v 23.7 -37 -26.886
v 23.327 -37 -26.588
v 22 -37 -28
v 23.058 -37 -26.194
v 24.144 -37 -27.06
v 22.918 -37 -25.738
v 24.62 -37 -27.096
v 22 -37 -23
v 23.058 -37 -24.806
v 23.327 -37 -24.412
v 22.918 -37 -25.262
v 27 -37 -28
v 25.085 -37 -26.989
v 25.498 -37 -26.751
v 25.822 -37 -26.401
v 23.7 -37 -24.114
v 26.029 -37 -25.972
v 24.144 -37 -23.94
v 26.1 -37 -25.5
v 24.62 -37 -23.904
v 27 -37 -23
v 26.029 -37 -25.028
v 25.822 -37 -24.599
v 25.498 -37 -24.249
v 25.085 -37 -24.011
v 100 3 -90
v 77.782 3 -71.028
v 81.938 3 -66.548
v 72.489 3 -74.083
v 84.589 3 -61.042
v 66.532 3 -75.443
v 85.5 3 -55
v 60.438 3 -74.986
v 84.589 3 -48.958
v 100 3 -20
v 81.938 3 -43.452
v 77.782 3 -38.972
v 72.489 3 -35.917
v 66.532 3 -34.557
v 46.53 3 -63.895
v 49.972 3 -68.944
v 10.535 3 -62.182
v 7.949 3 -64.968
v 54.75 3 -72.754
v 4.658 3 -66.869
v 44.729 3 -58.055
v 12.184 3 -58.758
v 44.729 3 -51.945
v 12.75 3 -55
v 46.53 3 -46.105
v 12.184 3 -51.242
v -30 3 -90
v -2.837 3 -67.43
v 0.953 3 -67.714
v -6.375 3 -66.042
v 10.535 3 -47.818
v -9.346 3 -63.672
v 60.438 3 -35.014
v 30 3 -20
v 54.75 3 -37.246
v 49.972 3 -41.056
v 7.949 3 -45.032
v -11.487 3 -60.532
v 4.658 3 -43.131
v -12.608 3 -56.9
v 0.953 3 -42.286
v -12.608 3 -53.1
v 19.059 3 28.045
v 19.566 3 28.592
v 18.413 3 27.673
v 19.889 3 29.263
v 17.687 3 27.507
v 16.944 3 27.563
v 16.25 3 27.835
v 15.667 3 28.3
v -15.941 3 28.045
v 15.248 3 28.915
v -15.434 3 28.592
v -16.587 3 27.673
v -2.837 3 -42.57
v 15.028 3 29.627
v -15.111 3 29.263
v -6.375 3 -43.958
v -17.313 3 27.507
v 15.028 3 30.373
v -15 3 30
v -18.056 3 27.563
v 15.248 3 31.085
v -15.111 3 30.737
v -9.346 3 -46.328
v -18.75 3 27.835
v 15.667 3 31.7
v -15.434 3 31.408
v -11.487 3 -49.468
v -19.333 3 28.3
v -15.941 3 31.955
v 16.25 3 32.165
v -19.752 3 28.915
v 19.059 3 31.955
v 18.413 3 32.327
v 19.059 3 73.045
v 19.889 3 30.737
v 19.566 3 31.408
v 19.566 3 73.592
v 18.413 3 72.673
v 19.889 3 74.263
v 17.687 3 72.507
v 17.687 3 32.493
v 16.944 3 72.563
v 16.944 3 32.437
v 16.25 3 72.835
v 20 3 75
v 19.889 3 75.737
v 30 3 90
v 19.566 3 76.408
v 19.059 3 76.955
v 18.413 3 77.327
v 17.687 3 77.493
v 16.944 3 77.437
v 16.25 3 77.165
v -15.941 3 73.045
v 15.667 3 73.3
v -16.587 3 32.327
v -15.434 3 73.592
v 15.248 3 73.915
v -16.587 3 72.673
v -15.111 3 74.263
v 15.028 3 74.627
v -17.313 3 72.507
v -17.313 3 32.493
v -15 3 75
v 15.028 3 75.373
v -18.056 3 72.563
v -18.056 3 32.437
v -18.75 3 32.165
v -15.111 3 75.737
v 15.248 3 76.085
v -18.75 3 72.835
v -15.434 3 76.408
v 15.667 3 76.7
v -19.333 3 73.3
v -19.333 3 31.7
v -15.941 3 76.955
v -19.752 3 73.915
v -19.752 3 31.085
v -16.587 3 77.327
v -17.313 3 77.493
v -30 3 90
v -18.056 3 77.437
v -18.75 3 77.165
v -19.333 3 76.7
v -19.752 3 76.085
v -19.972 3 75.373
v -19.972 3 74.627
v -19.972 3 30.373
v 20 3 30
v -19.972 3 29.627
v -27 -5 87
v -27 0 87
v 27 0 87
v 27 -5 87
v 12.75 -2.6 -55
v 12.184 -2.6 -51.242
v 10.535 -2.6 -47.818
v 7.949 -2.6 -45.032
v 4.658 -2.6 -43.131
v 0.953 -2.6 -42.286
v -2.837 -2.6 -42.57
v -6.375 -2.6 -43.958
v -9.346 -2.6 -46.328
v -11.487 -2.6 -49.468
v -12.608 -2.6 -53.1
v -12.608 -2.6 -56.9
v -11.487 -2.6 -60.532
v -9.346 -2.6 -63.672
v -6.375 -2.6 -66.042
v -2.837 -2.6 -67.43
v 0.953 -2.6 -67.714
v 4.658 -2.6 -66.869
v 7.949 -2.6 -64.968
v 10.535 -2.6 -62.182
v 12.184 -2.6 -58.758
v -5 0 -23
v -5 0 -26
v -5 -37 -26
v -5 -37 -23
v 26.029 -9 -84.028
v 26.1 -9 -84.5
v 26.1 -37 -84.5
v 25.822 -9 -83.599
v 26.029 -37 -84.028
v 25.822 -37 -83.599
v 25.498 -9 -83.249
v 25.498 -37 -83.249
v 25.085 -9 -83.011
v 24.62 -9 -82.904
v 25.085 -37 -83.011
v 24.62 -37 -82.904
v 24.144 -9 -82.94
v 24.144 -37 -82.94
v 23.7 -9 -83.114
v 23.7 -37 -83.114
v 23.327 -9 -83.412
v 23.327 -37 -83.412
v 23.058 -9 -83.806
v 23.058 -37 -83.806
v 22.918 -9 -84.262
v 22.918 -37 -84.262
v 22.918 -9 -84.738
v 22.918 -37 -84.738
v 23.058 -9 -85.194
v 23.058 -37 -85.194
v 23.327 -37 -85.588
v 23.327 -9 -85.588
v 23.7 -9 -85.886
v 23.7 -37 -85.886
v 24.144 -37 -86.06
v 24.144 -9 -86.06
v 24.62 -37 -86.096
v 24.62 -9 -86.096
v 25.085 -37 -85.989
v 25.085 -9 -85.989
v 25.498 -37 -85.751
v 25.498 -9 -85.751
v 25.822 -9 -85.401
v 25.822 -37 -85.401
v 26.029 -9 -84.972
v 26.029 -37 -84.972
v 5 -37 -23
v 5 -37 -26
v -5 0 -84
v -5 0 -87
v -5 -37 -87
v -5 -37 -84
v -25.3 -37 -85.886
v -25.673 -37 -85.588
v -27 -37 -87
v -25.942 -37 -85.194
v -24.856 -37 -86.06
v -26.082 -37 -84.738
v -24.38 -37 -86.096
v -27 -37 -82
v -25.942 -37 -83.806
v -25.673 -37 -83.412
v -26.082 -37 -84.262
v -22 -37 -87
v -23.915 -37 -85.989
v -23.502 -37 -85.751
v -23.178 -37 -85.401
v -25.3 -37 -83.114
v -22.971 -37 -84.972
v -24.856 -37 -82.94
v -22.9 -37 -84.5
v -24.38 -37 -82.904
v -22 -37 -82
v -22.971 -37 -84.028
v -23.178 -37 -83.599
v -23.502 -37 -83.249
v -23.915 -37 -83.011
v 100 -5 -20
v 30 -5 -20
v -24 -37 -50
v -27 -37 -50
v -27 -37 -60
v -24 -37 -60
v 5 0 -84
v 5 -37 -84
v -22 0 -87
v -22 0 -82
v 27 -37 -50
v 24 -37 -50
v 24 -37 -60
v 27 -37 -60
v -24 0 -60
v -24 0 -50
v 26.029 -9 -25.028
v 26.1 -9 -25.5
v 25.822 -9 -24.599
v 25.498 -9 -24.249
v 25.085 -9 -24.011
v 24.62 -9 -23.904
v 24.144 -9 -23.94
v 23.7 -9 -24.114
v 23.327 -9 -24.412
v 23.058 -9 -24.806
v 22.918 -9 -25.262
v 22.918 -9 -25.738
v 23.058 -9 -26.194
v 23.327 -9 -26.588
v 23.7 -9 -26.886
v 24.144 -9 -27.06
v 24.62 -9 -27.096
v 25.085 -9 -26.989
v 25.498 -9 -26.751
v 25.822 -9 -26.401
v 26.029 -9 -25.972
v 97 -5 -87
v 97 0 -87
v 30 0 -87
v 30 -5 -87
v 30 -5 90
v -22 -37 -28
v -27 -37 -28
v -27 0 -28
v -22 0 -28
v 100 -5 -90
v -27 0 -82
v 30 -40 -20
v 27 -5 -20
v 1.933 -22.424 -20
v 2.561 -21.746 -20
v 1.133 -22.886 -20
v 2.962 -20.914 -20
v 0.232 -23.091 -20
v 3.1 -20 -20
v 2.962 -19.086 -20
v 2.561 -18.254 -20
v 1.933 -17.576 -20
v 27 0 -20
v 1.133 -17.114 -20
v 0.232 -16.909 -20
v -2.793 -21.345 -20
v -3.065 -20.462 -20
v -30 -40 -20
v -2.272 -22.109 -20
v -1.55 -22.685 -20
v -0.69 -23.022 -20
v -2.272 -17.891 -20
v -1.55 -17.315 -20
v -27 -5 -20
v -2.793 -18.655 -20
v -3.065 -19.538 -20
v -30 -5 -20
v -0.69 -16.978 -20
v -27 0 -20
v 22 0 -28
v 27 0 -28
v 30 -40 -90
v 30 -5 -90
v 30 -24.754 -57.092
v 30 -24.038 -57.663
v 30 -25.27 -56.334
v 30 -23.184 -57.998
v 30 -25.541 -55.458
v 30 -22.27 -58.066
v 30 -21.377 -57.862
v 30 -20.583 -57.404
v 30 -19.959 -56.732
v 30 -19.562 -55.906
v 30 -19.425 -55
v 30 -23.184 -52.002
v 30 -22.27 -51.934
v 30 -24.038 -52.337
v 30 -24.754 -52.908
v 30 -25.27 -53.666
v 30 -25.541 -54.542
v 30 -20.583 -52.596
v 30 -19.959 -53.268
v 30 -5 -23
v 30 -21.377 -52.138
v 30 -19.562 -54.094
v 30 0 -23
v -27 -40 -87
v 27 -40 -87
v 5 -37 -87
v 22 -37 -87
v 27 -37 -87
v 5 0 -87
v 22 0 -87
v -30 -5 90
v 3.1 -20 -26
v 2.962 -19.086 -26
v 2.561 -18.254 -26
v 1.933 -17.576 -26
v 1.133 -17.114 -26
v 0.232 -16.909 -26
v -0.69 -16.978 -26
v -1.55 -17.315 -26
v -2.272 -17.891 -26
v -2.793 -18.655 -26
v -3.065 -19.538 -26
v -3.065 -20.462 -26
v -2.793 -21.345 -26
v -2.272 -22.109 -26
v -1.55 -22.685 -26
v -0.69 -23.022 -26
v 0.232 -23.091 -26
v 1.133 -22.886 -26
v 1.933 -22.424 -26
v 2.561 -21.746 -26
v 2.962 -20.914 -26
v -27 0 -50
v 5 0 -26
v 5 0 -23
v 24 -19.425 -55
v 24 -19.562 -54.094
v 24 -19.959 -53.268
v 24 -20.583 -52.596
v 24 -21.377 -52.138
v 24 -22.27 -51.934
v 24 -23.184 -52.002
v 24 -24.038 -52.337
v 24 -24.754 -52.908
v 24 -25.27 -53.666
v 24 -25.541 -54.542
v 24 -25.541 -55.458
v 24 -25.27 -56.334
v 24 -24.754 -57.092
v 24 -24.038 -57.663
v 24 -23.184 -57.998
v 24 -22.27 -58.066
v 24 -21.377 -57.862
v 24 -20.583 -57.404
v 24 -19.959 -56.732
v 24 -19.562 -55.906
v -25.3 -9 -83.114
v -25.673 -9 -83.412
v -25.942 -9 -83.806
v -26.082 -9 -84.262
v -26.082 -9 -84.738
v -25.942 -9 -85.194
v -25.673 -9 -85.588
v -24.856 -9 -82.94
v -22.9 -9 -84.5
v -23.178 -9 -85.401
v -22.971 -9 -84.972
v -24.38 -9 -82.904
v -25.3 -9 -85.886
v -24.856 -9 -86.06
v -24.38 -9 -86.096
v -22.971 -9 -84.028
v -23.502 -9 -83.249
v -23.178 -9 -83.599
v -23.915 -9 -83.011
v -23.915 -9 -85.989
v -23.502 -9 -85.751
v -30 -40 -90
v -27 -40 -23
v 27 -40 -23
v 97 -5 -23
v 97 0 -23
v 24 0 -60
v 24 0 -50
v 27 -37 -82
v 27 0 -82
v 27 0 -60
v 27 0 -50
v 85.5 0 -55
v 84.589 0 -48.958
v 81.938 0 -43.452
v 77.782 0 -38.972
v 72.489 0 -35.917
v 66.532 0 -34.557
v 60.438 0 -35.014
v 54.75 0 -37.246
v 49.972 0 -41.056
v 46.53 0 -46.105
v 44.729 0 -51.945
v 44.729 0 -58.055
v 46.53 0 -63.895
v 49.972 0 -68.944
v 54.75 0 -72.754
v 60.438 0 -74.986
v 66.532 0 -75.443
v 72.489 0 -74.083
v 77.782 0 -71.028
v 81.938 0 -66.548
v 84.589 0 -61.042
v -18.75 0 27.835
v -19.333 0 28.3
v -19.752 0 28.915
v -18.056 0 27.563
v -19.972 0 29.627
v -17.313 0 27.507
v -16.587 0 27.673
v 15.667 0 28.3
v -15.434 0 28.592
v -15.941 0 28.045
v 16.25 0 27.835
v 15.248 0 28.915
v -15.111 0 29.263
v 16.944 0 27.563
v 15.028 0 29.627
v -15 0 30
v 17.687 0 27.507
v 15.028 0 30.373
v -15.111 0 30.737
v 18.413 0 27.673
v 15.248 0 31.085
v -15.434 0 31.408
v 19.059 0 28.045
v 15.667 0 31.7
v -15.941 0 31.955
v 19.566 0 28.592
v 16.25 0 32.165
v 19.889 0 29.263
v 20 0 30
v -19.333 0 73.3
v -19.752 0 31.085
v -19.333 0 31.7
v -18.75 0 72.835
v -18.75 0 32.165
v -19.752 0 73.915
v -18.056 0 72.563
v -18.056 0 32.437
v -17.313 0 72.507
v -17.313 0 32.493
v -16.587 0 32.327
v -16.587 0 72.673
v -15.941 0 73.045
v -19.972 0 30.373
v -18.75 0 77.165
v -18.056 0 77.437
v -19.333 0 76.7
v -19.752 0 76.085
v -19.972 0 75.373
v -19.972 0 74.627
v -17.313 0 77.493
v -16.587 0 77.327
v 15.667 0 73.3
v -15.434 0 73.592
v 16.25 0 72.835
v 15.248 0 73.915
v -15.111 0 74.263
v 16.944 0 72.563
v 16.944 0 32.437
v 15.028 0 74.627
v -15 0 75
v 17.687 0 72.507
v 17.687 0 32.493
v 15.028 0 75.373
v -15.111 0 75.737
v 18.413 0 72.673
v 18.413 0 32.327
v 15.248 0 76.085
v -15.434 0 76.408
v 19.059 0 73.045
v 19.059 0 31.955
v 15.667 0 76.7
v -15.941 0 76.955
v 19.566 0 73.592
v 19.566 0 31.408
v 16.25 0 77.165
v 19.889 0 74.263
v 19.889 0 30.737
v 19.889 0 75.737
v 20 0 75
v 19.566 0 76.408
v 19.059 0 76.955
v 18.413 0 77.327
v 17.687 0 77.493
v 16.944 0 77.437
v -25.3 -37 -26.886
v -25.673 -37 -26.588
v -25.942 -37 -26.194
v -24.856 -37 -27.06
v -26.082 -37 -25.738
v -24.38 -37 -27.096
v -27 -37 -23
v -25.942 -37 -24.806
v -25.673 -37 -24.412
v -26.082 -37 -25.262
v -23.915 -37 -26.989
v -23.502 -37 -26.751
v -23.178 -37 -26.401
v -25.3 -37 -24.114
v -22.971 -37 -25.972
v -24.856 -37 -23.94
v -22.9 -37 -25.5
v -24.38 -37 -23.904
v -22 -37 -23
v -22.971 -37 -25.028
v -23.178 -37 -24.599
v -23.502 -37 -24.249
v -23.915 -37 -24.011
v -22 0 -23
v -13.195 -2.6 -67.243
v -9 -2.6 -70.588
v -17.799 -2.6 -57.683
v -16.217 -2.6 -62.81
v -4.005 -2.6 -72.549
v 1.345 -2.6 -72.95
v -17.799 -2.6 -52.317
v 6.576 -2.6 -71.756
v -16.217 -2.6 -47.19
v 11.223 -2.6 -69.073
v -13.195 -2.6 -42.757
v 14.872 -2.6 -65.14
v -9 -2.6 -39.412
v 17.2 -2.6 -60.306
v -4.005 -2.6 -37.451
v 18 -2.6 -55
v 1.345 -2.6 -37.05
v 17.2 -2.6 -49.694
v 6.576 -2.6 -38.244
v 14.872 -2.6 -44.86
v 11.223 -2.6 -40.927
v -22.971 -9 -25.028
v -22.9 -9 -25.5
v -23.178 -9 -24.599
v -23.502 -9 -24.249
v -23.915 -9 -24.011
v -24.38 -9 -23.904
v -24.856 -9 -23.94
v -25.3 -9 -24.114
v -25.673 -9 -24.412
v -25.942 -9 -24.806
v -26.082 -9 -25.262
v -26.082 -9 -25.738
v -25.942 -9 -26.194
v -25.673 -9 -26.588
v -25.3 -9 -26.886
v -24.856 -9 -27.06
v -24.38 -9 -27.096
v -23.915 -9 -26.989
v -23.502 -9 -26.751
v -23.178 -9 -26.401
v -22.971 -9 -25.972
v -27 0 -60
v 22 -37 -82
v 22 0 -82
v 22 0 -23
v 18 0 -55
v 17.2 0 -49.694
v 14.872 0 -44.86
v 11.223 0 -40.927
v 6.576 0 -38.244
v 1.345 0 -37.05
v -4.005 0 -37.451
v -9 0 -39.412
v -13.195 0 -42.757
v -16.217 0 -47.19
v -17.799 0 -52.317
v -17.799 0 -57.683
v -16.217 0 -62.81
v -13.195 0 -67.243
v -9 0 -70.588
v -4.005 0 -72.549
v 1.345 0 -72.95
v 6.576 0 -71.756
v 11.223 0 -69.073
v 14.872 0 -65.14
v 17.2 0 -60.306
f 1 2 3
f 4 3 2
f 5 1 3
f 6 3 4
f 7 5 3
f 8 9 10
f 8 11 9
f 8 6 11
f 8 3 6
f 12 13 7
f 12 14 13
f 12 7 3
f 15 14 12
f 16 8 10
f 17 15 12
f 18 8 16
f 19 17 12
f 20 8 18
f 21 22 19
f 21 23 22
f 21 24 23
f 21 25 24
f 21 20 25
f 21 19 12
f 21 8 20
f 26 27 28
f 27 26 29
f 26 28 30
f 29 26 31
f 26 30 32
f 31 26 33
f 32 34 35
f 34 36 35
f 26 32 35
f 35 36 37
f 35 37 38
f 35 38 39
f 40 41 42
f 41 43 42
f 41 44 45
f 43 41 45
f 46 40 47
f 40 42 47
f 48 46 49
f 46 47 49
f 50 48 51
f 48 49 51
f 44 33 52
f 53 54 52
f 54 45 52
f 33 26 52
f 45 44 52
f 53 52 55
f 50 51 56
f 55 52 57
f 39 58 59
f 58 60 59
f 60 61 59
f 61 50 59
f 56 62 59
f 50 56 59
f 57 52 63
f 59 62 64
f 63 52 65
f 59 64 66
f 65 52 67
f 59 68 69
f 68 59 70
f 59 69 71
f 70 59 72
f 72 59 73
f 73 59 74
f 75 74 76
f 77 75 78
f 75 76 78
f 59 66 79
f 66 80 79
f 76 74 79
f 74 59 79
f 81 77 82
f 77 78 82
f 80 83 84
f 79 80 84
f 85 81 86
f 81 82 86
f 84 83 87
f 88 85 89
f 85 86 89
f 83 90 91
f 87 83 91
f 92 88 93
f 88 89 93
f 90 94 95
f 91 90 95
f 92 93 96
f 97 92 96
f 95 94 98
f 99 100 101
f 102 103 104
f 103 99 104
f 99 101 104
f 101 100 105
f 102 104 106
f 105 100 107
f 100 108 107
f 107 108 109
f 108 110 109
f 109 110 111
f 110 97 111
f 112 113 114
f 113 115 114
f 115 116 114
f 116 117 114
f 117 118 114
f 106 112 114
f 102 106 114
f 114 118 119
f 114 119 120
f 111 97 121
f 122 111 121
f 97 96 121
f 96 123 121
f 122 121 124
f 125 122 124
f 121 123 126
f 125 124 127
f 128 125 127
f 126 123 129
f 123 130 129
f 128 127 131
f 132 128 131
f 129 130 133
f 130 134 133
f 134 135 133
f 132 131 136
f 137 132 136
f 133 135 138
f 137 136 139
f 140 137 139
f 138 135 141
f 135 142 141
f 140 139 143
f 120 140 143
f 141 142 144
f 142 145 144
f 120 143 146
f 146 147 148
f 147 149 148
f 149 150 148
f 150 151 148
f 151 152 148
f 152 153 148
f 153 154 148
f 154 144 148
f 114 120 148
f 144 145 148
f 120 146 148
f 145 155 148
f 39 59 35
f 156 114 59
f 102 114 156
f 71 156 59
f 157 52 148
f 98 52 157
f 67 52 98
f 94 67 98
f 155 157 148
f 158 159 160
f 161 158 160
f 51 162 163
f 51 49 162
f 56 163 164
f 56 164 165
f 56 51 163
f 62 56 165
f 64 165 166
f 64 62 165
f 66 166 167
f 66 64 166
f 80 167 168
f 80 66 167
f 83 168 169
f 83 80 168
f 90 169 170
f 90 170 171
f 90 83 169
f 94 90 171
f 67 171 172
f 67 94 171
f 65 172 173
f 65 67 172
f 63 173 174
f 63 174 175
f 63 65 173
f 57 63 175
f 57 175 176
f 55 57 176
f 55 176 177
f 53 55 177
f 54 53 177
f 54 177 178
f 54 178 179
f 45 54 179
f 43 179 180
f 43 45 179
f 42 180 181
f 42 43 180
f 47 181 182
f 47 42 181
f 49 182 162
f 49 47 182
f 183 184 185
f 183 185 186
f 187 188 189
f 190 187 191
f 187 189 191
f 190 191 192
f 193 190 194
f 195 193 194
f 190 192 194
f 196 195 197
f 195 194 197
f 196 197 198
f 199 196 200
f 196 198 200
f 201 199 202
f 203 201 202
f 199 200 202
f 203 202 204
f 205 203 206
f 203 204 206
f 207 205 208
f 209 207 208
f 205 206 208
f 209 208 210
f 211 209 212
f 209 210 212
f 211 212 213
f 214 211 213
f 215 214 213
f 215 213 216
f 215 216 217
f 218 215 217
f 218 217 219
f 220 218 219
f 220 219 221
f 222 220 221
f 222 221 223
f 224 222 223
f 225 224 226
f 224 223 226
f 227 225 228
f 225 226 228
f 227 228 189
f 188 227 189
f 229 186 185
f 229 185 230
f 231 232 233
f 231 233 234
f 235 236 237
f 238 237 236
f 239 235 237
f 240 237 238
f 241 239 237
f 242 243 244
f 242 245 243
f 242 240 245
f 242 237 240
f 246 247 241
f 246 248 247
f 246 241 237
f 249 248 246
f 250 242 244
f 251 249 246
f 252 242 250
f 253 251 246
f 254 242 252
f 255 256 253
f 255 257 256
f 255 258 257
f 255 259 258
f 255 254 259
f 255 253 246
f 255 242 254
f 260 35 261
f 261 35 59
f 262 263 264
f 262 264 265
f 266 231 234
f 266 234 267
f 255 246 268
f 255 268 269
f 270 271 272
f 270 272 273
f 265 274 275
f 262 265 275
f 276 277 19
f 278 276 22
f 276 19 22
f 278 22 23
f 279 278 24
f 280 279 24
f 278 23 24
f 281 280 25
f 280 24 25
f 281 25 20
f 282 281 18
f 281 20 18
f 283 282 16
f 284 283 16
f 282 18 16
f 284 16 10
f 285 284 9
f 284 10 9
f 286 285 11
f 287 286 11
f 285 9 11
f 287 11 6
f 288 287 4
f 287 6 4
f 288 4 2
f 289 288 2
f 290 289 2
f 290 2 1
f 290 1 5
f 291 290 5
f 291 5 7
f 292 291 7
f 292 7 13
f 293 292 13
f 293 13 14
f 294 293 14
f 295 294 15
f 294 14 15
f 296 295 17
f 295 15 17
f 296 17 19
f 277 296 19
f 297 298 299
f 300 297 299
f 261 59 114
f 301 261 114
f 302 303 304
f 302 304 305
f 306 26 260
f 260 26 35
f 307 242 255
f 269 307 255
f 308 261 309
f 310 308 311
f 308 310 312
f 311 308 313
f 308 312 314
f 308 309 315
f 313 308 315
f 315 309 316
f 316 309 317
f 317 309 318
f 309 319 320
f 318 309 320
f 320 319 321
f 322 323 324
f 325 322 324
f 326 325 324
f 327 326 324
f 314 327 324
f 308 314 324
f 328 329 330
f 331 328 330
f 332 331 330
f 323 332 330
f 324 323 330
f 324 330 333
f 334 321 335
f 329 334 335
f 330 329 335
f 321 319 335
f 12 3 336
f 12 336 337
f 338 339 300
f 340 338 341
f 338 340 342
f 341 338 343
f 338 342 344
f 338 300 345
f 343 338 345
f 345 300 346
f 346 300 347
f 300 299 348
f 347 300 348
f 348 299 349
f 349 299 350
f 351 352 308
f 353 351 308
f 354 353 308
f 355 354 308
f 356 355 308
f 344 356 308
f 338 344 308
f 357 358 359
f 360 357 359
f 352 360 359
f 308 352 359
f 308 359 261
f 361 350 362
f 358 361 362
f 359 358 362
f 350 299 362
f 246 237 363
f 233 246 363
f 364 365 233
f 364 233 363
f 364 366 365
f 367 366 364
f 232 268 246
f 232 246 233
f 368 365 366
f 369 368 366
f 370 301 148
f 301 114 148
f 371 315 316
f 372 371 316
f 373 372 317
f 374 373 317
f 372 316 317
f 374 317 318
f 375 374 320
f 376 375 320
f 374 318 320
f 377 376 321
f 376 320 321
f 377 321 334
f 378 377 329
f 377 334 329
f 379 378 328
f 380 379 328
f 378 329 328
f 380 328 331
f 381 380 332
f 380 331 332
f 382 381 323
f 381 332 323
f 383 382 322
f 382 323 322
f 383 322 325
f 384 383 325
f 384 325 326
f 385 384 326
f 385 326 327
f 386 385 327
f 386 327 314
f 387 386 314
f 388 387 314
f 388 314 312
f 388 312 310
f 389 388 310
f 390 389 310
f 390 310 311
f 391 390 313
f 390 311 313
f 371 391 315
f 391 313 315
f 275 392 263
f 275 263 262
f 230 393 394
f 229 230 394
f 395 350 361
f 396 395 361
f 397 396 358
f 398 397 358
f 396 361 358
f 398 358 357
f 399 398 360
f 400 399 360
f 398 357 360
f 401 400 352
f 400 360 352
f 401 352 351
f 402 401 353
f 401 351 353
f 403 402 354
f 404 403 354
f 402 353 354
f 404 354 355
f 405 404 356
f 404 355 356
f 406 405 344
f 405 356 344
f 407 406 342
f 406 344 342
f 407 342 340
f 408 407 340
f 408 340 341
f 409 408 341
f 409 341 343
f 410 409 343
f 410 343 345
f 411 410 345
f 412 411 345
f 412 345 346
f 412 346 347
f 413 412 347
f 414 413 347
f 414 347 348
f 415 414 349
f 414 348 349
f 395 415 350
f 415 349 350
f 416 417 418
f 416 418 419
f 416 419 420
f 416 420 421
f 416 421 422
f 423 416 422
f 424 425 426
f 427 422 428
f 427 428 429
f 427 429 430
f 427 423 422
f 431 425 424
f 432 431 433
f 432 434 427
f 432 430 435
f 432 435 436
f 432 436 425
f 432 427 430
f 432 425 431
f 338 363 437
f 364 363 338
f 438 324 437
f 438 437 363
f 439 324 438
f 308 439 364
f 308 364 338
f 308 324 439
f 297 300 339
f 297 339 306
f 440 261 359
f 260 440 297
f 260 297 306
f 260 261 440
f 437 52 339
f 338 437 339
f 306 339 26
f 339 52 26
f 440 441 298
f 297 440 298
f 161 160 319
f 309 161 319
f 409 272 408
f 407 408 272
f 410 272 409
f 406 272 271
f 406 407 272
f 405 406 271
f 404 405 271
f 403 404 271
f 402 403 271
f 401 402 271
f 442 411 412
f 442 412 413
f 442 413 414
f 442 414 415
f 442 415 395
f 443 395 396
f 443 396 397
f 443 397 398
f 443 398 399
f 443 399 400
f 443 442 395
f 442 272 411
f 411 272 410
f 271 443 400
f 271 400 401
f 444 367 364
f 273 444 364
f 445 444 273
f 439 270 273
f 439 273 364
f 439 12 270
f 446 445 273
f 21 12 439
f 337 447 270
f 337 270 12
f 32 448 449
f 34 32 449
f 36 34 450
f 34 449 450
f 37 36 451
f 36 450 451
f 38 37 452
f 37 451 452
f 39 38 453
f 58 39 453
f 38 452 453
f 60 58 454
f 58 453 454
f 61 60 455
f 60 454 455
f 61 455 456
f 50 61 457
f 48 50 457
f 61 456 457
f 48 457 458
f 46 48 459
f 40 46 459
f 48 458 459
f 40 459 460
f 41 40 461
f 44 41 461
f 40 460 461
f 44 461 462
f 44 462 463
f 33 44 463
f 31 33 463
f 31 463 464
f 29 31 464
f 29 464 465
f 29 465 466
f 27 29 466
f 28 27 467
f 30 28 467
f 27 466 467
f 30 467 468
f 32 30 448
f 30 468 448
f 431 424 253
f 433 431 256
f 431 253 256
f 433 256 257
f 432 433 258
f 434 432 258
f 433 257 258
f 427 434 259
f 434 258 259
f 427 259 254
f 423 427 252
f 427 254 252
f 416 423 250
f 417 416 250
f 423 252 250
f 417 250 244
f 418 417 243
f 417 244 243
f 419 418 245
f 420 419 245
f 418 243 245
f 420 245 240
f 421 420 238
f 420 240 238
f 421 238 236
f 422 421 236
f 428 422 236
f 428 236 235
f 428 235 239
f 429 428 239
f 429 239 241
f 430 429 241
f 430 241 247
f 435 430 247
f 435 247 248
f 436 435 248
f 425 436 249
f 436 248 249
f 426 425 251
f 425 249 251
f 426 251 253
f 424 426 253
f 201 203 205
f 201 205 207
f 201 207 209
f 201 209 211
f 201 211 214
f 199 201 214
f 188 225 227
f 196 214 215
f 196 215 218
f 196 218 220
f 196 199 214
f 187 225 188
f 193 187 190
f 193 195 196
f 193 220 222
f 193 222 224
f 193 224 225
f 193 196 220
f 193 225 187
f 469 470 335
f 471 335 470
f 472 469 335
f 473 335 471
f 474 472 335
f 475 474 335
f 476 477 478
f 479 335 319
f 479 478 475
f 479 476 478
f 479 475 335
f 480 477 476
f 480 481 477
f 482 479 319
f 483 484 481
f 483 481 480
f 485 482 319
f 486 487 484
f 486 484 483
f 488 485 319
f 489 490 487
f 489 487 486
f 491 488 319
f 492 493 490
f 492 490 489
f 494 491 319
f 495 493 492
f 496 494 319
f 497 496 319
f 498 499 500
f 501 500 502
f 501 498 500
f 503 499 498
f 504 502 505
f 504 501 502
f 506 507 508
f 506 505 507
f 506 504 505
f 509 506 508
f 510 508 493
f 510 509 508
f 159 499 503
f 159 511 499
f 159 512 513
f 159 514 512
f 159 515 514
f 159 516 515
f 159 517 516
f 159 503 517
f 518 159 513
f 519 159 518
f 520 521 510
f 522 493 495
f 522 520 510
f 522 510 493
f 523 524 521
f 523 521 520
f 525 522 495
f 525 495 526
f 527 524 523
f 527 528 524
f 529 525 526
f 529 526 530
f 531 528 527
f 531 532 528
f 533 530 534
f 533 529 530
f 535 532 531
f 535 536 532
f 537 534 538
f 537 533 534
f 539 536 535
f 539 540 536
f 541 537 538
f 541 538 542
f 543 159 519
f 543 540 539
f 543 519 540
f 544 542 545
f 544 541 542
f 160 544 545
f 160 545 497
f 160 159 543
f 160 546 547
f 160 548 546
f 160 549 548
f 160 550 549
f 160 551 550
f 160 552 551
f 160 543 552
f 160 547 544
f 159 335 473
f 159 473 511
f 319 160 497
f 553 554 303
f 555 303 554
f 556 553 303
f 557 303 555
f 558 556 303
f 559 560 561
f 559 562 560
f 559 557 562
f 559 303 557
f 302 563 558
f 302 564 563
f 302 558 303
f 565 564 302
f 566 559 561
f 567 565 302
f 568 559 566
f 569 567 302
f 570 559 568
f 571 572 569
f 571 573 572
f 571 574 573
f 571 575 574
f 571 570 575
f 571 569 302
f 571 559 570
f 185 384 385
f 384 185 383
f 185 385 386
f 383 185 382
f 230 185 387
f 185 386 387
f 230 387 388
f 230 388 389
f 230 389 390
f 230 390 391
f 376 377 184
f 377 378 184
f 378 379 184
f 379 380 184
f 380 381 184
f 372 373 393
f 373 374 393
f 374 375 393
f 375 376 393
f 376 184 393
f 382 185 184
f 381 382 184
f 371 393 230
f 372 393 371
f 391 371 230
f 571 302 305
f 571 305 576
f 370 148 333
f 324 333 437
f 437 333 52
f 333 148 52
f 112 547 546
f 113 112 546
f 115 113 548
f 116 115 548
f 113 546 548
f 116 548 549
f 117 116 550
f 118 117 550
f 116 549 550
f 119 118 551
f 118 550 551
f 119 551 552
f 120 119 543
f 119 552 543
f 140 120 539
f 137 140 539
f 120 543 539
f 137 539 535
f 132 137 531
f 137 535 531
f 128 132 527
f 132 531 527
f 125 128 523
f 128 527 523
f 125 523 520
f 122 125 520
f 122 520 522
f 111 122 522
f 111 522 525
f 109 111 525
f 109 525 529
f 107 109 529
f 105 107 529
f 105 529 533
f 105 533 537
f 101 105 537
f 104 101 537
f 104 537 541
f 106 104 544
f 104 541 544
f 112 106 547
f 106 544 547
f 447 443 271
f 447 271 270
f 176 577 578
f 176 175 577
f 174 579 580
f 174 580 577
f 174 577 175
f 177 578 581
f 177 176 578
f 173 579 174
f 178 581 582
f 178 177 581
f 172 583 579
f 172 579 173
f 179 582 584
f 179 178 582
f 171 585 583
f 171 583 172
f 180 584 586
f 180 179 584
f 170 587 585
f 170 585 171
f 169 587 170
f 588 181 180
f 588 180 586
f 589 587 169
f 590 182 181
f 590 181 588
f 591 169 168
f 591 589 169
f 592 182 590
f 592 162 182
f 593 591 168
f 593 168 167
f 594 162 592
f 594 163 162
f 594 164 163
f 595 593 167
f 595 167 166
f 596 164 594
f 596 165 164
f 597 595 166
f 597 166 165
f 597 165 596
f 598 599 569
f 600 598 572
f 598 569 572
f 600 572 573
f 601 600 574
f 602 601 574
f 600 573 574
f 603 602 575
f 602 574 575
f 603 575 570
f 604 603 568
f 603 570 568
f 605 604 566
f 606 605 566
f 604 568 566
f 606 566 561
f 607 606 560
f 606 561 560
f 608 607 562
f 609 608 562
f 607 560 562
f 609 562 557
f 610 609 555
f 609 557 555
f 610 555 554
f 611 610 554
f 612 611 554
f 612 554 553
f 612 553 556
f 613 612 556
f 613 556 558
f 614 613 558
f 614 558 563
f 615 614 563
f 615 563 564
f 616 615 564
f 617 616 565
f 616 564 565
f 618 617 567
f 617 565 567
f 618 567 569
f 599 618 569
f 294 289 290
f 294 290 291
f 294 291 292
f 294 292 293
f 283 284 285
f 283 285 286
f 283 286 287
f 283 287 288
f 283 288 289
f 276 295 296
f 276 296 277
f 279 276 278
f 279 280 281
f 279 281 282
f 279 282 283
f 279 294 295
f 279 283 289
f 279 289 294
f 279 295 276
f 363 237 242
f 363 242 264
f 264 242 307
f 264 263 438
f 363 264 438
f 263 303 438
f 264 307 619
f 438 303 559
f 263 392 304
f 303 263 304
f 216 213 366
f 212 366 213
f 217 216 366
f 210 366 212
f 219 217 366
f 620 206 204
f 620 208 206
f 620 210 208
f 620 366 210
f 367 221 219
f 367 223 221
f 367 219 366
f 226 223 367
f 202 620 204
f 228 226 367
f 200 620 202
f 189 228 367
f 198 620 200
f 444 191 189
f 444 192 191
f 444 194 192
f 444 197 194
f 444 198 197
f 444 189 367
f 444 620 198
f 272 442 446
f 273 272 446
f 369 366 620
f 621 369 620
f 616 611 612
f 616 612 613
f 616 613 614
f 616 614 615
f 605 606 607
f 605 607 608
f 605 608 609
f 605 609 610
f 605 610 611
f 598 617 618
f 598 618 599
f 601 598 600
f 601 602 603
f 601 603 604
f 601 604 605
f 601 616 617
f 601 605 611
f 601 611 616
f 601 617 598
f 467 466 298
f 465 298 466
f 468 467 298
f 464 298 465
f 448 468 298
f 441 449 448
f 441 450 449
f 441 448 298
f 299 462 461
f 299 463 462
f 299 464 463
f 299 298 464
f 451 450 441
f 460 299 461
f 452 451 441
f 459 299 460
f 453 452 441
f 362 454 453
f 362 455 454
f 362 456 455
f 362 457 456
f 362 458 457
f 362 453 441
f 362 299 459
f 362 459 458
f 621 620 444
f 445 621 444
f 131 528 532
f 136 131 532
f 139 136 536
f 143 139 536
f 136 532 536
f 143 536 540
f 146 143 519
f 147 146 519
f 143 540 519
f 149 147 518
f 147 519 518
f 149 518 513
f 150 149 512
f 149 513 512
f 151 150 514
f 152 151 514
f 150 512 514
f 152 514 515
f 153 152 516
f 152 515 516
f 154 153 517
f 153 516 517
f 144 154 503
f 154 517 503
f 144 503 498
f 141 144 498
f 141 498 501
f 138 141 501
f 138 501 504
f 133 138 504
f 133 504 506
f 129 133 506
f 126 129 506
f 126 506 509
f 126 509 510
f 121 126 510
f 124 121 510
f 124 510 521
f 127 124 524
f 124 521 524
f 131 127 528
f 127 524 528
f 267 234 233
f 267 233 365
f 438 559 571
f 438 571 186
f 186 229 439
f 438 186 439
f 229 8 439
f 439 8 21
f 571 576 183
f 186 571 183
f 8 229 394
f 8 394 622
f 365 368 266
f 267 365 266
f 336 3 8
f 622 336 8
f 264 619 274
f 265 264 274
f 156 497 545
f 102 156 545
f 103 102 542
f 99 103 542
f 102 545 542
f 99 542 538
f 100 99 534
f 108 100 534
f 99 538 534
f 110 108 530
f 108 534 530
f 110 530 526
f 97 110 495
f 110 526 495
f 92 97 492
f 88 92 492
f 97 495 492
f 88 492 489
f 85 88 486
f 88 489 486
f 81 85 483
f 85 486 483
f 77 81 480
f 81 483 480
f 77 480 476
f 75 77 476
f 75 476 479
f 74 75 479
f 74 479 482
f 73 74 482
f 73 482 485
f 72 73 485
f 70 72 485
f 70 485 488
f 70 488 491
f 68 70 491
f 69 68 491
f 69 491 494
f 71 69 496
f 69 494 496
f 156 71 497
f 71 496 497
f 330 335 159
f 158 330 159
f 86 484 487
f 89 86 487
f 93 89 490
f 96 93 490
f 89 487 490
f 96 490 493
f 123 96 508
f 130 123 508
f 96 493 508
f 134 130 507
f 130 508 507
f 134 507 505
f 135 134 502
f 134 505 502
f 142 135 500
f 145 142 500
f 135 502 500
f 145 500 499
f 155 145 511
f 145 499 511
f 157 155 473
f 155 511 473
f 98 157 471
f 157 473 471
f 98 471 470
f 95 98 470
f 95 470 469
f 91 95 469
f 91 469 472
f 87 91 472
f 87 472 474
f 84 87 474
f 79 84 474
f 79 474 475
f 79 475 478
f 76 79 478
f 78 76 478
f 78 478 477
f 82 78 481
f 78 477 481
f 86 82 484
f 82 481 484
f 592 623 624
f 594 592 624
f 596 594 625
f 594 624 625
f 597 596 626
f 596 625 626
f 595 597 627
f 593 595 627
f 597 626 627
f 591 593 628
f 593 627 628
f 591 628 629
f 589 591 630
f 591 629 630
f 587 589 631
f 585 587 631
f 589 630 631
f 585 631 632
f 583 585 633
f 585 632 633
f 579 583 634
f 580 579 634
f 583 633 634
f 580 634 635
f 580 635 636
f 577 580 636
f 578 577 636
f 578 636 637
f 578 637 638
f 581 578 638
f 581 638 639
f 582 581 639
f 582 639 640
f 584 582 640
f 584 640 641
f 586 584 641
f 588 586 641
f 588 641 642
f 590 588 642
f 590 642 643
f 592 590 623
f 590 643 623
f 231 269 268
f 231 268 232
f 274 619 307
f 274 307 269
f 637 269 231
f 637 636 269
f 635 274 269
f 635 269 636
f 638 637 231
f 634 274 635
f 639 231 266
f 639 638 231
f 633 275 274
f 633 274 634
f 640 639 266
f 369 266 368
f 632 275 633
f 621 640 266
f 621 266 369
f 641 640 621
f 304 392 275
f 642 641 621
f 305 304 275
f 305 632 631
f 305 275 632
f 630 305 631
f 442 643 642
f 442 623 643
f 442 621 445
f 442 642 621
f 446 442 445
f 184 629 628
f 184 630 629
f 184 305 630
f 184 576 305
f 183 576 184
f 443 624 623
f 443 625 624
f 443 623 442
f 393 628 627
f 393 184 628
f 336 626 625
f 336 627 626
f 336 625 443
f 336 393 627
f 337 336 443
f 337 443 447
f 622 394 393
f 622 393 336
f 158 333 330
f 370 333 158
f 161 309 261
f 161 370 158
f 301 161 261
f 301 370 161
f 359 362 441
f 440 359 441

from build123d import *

# Parameters (mm, degrees)
F0_W      = 60
F0_H      = 180
F0_R      = 12.75
F0_R_2    = 2.5
F1_DEPTH  = 3
F2_R      = 18
F2_R_2    = 12.75
F3_DEPTH  = 2.6
F4_W      = 60
F4_H      = 70
F4_W_2    = 54
F4_H_2    = 64
F5_DEPTH  = 40
F6_W      = 5
F6_H      = 5
F6_W_2    = 10
F6_H_2    = 3
F6_W_3    = 3
F6_H_3    = 10
F7_DEPTH  = 37
F8_R      = 1.6
F9_DEPTH  = 28
F10_W     = 3
F10_H     = 70
F11_DEPTH = 70
F13_R     = 20.5
F14_DEPTH = 3
F16_DEPTH = 5
F17_R     = 3.075
F18_DEPTH = 6
F19_R     = 3.1
F20_DEPTH = 6
F22_DEPTH = 5


with BuildPart() as f1:
    # F0 (on Front) → F1 (new body)
    with BuildSketch(Plane.XZ):
        Rectangle(F0_W, F0_H)
        with Locations((0, -55)):
            Circle(F0_R, mode=Mode.SUBTRACT)
        with Locations((-17.5, 30)):
            Circle(F0_R_2, mode=Mode.SUBTRACT)
        with Locations((-17.5, 75)):
            Circle(F0_R_2, mode=Mode.SUBTRACT)
        with Locations((17.5, 30)):
            Circle(F0_R_2, mode=Mode.SUBTRACT)
        with Locations((17.5, 75)):
            Circle(F0_R_2, mode=Mode.SUBTRACT)
    extrude(amount=-F1_DEPTH)

    # F2 (on face) → F3 (join)
    with BuildSketch(Plane.XZ):
        with Locations((0, -55)):
            Circle(F2_R)
        with Locations((0, -55)):
            Circle(F2_R_2, mode=Mode.SUBTRACT)
    extrude(amount=F3_DEPTH)

    # F4 (on face) → F5 (join)
    with BuildSketch(Plane.XZ):
        with Locations((0, -55)):
            Rectangle(F4_W, F4_H)
        with Locations((0, -55)):
            Rectangle(F4_W_2, F4_H_2, mode=Mode.SUBTRACT)
    extrude(amount=F5_DEPTH)

    # F6 (on face) → F7 (join)
    with BuildSketch(Plane.XZ):
        with Locations((-24.5, -25.5)):
            Rectangle(F6_W, F6_H)
        with Locations((0, -24.5)):
            Rectangle(F6_W_2, F6_H_2)
        with Locations((24.5, -25.5)):
            Rectangle(F6_W, F6_H)
        with Locations((25.5, -55)):
            Rectangle(F6_W_3, F6_H_3)
        with Locations((-25.5, -55)):
            Rectangle(F6_W_3, F6_H_3)
        with Locations((24.5, -84.5)):
            Rectangle(F6_W, F6_H)
        with Locations((0, -85.5)):
            Rectangle(F6_W_2, F6_H_2)
        with Locations((-24.5, -84.5)):
            Rectangle(F6_W, F6_H)
    extrude(amount=F7_DEPTH)

    # F8 (on face) → F9 (cut)
    with BuildSketch(Plane.XZ.offset(37)):
        with Locations((24.5, -25.5)):
            Circle(F8_R)
        with Locations((-24.5, -25.5)):
            Circle(F8_R)
        with Locations((24.5, -84.5)):
            Circle(F8_R)
        with Locations((-24.5, -84.5)):
            Circle(F8_R)
    extrude(amount=-F9_DEPTH, mode=Mode.SUBTRACT)

    # F10 (on face) → F11 (join)
    with BuildSketch(Plane.YZ.offset(30)):
        with Locations((1.5, -55)):
            Rectangle(F10_W, F10_H)
    extrude(amount=F11_DEPTH)

    # F13 (on face) → F14 (cut, through all)
    with BuildSketch(Plane.XZ):
        with Locations((65, -55)):
            Circle(F13_R)
    extrude(amount=-F14_DEPTH, mode=Mode.SUBTRACT)

    # F15 (on face) → F16 (join)
    with BuildSketch(Plane.XZ):
        Polygon((100, -20), (30, -20), (30, -23), (97, -23), (97, -87), (30, -87), (30, -90), (100, -90), (100, -87), (100, -23), align=None)
    extrude(amount=F16_DEPTH)

    # F17 (on face) → F18 (cut, through all)
    with BuildSketch(Plane.YZ.offset(30)):
        with Locations((-22.5, -55)):
            Circle(F17_R)
    extrude(amount=-F18_DEPTH, mode=Mode.SUBTRACT)

    # F19 (on face) → F20 (cut, through all)
    with BuildSketch(Plane.XY.offset(-20)):
        with Locations((0, -20)):
            Circle(F19_R)
    extrude(amount=-F20_DEPTH, mode=Mode.SUBTRACT)

    # F21 (on face) → F22 (join)
    with BuildSketch(Plane.XZ):
        Polygon((30, -20), (30, 90), (27, 90), (21.684641, 90), (-27, 90), (-30, 90), (-30, -20), (-27, -20), (-27, 87), (27, 87), (27, -20), align=None)
    extrude(amount=F22_DEPTH)


solid = f1.part
